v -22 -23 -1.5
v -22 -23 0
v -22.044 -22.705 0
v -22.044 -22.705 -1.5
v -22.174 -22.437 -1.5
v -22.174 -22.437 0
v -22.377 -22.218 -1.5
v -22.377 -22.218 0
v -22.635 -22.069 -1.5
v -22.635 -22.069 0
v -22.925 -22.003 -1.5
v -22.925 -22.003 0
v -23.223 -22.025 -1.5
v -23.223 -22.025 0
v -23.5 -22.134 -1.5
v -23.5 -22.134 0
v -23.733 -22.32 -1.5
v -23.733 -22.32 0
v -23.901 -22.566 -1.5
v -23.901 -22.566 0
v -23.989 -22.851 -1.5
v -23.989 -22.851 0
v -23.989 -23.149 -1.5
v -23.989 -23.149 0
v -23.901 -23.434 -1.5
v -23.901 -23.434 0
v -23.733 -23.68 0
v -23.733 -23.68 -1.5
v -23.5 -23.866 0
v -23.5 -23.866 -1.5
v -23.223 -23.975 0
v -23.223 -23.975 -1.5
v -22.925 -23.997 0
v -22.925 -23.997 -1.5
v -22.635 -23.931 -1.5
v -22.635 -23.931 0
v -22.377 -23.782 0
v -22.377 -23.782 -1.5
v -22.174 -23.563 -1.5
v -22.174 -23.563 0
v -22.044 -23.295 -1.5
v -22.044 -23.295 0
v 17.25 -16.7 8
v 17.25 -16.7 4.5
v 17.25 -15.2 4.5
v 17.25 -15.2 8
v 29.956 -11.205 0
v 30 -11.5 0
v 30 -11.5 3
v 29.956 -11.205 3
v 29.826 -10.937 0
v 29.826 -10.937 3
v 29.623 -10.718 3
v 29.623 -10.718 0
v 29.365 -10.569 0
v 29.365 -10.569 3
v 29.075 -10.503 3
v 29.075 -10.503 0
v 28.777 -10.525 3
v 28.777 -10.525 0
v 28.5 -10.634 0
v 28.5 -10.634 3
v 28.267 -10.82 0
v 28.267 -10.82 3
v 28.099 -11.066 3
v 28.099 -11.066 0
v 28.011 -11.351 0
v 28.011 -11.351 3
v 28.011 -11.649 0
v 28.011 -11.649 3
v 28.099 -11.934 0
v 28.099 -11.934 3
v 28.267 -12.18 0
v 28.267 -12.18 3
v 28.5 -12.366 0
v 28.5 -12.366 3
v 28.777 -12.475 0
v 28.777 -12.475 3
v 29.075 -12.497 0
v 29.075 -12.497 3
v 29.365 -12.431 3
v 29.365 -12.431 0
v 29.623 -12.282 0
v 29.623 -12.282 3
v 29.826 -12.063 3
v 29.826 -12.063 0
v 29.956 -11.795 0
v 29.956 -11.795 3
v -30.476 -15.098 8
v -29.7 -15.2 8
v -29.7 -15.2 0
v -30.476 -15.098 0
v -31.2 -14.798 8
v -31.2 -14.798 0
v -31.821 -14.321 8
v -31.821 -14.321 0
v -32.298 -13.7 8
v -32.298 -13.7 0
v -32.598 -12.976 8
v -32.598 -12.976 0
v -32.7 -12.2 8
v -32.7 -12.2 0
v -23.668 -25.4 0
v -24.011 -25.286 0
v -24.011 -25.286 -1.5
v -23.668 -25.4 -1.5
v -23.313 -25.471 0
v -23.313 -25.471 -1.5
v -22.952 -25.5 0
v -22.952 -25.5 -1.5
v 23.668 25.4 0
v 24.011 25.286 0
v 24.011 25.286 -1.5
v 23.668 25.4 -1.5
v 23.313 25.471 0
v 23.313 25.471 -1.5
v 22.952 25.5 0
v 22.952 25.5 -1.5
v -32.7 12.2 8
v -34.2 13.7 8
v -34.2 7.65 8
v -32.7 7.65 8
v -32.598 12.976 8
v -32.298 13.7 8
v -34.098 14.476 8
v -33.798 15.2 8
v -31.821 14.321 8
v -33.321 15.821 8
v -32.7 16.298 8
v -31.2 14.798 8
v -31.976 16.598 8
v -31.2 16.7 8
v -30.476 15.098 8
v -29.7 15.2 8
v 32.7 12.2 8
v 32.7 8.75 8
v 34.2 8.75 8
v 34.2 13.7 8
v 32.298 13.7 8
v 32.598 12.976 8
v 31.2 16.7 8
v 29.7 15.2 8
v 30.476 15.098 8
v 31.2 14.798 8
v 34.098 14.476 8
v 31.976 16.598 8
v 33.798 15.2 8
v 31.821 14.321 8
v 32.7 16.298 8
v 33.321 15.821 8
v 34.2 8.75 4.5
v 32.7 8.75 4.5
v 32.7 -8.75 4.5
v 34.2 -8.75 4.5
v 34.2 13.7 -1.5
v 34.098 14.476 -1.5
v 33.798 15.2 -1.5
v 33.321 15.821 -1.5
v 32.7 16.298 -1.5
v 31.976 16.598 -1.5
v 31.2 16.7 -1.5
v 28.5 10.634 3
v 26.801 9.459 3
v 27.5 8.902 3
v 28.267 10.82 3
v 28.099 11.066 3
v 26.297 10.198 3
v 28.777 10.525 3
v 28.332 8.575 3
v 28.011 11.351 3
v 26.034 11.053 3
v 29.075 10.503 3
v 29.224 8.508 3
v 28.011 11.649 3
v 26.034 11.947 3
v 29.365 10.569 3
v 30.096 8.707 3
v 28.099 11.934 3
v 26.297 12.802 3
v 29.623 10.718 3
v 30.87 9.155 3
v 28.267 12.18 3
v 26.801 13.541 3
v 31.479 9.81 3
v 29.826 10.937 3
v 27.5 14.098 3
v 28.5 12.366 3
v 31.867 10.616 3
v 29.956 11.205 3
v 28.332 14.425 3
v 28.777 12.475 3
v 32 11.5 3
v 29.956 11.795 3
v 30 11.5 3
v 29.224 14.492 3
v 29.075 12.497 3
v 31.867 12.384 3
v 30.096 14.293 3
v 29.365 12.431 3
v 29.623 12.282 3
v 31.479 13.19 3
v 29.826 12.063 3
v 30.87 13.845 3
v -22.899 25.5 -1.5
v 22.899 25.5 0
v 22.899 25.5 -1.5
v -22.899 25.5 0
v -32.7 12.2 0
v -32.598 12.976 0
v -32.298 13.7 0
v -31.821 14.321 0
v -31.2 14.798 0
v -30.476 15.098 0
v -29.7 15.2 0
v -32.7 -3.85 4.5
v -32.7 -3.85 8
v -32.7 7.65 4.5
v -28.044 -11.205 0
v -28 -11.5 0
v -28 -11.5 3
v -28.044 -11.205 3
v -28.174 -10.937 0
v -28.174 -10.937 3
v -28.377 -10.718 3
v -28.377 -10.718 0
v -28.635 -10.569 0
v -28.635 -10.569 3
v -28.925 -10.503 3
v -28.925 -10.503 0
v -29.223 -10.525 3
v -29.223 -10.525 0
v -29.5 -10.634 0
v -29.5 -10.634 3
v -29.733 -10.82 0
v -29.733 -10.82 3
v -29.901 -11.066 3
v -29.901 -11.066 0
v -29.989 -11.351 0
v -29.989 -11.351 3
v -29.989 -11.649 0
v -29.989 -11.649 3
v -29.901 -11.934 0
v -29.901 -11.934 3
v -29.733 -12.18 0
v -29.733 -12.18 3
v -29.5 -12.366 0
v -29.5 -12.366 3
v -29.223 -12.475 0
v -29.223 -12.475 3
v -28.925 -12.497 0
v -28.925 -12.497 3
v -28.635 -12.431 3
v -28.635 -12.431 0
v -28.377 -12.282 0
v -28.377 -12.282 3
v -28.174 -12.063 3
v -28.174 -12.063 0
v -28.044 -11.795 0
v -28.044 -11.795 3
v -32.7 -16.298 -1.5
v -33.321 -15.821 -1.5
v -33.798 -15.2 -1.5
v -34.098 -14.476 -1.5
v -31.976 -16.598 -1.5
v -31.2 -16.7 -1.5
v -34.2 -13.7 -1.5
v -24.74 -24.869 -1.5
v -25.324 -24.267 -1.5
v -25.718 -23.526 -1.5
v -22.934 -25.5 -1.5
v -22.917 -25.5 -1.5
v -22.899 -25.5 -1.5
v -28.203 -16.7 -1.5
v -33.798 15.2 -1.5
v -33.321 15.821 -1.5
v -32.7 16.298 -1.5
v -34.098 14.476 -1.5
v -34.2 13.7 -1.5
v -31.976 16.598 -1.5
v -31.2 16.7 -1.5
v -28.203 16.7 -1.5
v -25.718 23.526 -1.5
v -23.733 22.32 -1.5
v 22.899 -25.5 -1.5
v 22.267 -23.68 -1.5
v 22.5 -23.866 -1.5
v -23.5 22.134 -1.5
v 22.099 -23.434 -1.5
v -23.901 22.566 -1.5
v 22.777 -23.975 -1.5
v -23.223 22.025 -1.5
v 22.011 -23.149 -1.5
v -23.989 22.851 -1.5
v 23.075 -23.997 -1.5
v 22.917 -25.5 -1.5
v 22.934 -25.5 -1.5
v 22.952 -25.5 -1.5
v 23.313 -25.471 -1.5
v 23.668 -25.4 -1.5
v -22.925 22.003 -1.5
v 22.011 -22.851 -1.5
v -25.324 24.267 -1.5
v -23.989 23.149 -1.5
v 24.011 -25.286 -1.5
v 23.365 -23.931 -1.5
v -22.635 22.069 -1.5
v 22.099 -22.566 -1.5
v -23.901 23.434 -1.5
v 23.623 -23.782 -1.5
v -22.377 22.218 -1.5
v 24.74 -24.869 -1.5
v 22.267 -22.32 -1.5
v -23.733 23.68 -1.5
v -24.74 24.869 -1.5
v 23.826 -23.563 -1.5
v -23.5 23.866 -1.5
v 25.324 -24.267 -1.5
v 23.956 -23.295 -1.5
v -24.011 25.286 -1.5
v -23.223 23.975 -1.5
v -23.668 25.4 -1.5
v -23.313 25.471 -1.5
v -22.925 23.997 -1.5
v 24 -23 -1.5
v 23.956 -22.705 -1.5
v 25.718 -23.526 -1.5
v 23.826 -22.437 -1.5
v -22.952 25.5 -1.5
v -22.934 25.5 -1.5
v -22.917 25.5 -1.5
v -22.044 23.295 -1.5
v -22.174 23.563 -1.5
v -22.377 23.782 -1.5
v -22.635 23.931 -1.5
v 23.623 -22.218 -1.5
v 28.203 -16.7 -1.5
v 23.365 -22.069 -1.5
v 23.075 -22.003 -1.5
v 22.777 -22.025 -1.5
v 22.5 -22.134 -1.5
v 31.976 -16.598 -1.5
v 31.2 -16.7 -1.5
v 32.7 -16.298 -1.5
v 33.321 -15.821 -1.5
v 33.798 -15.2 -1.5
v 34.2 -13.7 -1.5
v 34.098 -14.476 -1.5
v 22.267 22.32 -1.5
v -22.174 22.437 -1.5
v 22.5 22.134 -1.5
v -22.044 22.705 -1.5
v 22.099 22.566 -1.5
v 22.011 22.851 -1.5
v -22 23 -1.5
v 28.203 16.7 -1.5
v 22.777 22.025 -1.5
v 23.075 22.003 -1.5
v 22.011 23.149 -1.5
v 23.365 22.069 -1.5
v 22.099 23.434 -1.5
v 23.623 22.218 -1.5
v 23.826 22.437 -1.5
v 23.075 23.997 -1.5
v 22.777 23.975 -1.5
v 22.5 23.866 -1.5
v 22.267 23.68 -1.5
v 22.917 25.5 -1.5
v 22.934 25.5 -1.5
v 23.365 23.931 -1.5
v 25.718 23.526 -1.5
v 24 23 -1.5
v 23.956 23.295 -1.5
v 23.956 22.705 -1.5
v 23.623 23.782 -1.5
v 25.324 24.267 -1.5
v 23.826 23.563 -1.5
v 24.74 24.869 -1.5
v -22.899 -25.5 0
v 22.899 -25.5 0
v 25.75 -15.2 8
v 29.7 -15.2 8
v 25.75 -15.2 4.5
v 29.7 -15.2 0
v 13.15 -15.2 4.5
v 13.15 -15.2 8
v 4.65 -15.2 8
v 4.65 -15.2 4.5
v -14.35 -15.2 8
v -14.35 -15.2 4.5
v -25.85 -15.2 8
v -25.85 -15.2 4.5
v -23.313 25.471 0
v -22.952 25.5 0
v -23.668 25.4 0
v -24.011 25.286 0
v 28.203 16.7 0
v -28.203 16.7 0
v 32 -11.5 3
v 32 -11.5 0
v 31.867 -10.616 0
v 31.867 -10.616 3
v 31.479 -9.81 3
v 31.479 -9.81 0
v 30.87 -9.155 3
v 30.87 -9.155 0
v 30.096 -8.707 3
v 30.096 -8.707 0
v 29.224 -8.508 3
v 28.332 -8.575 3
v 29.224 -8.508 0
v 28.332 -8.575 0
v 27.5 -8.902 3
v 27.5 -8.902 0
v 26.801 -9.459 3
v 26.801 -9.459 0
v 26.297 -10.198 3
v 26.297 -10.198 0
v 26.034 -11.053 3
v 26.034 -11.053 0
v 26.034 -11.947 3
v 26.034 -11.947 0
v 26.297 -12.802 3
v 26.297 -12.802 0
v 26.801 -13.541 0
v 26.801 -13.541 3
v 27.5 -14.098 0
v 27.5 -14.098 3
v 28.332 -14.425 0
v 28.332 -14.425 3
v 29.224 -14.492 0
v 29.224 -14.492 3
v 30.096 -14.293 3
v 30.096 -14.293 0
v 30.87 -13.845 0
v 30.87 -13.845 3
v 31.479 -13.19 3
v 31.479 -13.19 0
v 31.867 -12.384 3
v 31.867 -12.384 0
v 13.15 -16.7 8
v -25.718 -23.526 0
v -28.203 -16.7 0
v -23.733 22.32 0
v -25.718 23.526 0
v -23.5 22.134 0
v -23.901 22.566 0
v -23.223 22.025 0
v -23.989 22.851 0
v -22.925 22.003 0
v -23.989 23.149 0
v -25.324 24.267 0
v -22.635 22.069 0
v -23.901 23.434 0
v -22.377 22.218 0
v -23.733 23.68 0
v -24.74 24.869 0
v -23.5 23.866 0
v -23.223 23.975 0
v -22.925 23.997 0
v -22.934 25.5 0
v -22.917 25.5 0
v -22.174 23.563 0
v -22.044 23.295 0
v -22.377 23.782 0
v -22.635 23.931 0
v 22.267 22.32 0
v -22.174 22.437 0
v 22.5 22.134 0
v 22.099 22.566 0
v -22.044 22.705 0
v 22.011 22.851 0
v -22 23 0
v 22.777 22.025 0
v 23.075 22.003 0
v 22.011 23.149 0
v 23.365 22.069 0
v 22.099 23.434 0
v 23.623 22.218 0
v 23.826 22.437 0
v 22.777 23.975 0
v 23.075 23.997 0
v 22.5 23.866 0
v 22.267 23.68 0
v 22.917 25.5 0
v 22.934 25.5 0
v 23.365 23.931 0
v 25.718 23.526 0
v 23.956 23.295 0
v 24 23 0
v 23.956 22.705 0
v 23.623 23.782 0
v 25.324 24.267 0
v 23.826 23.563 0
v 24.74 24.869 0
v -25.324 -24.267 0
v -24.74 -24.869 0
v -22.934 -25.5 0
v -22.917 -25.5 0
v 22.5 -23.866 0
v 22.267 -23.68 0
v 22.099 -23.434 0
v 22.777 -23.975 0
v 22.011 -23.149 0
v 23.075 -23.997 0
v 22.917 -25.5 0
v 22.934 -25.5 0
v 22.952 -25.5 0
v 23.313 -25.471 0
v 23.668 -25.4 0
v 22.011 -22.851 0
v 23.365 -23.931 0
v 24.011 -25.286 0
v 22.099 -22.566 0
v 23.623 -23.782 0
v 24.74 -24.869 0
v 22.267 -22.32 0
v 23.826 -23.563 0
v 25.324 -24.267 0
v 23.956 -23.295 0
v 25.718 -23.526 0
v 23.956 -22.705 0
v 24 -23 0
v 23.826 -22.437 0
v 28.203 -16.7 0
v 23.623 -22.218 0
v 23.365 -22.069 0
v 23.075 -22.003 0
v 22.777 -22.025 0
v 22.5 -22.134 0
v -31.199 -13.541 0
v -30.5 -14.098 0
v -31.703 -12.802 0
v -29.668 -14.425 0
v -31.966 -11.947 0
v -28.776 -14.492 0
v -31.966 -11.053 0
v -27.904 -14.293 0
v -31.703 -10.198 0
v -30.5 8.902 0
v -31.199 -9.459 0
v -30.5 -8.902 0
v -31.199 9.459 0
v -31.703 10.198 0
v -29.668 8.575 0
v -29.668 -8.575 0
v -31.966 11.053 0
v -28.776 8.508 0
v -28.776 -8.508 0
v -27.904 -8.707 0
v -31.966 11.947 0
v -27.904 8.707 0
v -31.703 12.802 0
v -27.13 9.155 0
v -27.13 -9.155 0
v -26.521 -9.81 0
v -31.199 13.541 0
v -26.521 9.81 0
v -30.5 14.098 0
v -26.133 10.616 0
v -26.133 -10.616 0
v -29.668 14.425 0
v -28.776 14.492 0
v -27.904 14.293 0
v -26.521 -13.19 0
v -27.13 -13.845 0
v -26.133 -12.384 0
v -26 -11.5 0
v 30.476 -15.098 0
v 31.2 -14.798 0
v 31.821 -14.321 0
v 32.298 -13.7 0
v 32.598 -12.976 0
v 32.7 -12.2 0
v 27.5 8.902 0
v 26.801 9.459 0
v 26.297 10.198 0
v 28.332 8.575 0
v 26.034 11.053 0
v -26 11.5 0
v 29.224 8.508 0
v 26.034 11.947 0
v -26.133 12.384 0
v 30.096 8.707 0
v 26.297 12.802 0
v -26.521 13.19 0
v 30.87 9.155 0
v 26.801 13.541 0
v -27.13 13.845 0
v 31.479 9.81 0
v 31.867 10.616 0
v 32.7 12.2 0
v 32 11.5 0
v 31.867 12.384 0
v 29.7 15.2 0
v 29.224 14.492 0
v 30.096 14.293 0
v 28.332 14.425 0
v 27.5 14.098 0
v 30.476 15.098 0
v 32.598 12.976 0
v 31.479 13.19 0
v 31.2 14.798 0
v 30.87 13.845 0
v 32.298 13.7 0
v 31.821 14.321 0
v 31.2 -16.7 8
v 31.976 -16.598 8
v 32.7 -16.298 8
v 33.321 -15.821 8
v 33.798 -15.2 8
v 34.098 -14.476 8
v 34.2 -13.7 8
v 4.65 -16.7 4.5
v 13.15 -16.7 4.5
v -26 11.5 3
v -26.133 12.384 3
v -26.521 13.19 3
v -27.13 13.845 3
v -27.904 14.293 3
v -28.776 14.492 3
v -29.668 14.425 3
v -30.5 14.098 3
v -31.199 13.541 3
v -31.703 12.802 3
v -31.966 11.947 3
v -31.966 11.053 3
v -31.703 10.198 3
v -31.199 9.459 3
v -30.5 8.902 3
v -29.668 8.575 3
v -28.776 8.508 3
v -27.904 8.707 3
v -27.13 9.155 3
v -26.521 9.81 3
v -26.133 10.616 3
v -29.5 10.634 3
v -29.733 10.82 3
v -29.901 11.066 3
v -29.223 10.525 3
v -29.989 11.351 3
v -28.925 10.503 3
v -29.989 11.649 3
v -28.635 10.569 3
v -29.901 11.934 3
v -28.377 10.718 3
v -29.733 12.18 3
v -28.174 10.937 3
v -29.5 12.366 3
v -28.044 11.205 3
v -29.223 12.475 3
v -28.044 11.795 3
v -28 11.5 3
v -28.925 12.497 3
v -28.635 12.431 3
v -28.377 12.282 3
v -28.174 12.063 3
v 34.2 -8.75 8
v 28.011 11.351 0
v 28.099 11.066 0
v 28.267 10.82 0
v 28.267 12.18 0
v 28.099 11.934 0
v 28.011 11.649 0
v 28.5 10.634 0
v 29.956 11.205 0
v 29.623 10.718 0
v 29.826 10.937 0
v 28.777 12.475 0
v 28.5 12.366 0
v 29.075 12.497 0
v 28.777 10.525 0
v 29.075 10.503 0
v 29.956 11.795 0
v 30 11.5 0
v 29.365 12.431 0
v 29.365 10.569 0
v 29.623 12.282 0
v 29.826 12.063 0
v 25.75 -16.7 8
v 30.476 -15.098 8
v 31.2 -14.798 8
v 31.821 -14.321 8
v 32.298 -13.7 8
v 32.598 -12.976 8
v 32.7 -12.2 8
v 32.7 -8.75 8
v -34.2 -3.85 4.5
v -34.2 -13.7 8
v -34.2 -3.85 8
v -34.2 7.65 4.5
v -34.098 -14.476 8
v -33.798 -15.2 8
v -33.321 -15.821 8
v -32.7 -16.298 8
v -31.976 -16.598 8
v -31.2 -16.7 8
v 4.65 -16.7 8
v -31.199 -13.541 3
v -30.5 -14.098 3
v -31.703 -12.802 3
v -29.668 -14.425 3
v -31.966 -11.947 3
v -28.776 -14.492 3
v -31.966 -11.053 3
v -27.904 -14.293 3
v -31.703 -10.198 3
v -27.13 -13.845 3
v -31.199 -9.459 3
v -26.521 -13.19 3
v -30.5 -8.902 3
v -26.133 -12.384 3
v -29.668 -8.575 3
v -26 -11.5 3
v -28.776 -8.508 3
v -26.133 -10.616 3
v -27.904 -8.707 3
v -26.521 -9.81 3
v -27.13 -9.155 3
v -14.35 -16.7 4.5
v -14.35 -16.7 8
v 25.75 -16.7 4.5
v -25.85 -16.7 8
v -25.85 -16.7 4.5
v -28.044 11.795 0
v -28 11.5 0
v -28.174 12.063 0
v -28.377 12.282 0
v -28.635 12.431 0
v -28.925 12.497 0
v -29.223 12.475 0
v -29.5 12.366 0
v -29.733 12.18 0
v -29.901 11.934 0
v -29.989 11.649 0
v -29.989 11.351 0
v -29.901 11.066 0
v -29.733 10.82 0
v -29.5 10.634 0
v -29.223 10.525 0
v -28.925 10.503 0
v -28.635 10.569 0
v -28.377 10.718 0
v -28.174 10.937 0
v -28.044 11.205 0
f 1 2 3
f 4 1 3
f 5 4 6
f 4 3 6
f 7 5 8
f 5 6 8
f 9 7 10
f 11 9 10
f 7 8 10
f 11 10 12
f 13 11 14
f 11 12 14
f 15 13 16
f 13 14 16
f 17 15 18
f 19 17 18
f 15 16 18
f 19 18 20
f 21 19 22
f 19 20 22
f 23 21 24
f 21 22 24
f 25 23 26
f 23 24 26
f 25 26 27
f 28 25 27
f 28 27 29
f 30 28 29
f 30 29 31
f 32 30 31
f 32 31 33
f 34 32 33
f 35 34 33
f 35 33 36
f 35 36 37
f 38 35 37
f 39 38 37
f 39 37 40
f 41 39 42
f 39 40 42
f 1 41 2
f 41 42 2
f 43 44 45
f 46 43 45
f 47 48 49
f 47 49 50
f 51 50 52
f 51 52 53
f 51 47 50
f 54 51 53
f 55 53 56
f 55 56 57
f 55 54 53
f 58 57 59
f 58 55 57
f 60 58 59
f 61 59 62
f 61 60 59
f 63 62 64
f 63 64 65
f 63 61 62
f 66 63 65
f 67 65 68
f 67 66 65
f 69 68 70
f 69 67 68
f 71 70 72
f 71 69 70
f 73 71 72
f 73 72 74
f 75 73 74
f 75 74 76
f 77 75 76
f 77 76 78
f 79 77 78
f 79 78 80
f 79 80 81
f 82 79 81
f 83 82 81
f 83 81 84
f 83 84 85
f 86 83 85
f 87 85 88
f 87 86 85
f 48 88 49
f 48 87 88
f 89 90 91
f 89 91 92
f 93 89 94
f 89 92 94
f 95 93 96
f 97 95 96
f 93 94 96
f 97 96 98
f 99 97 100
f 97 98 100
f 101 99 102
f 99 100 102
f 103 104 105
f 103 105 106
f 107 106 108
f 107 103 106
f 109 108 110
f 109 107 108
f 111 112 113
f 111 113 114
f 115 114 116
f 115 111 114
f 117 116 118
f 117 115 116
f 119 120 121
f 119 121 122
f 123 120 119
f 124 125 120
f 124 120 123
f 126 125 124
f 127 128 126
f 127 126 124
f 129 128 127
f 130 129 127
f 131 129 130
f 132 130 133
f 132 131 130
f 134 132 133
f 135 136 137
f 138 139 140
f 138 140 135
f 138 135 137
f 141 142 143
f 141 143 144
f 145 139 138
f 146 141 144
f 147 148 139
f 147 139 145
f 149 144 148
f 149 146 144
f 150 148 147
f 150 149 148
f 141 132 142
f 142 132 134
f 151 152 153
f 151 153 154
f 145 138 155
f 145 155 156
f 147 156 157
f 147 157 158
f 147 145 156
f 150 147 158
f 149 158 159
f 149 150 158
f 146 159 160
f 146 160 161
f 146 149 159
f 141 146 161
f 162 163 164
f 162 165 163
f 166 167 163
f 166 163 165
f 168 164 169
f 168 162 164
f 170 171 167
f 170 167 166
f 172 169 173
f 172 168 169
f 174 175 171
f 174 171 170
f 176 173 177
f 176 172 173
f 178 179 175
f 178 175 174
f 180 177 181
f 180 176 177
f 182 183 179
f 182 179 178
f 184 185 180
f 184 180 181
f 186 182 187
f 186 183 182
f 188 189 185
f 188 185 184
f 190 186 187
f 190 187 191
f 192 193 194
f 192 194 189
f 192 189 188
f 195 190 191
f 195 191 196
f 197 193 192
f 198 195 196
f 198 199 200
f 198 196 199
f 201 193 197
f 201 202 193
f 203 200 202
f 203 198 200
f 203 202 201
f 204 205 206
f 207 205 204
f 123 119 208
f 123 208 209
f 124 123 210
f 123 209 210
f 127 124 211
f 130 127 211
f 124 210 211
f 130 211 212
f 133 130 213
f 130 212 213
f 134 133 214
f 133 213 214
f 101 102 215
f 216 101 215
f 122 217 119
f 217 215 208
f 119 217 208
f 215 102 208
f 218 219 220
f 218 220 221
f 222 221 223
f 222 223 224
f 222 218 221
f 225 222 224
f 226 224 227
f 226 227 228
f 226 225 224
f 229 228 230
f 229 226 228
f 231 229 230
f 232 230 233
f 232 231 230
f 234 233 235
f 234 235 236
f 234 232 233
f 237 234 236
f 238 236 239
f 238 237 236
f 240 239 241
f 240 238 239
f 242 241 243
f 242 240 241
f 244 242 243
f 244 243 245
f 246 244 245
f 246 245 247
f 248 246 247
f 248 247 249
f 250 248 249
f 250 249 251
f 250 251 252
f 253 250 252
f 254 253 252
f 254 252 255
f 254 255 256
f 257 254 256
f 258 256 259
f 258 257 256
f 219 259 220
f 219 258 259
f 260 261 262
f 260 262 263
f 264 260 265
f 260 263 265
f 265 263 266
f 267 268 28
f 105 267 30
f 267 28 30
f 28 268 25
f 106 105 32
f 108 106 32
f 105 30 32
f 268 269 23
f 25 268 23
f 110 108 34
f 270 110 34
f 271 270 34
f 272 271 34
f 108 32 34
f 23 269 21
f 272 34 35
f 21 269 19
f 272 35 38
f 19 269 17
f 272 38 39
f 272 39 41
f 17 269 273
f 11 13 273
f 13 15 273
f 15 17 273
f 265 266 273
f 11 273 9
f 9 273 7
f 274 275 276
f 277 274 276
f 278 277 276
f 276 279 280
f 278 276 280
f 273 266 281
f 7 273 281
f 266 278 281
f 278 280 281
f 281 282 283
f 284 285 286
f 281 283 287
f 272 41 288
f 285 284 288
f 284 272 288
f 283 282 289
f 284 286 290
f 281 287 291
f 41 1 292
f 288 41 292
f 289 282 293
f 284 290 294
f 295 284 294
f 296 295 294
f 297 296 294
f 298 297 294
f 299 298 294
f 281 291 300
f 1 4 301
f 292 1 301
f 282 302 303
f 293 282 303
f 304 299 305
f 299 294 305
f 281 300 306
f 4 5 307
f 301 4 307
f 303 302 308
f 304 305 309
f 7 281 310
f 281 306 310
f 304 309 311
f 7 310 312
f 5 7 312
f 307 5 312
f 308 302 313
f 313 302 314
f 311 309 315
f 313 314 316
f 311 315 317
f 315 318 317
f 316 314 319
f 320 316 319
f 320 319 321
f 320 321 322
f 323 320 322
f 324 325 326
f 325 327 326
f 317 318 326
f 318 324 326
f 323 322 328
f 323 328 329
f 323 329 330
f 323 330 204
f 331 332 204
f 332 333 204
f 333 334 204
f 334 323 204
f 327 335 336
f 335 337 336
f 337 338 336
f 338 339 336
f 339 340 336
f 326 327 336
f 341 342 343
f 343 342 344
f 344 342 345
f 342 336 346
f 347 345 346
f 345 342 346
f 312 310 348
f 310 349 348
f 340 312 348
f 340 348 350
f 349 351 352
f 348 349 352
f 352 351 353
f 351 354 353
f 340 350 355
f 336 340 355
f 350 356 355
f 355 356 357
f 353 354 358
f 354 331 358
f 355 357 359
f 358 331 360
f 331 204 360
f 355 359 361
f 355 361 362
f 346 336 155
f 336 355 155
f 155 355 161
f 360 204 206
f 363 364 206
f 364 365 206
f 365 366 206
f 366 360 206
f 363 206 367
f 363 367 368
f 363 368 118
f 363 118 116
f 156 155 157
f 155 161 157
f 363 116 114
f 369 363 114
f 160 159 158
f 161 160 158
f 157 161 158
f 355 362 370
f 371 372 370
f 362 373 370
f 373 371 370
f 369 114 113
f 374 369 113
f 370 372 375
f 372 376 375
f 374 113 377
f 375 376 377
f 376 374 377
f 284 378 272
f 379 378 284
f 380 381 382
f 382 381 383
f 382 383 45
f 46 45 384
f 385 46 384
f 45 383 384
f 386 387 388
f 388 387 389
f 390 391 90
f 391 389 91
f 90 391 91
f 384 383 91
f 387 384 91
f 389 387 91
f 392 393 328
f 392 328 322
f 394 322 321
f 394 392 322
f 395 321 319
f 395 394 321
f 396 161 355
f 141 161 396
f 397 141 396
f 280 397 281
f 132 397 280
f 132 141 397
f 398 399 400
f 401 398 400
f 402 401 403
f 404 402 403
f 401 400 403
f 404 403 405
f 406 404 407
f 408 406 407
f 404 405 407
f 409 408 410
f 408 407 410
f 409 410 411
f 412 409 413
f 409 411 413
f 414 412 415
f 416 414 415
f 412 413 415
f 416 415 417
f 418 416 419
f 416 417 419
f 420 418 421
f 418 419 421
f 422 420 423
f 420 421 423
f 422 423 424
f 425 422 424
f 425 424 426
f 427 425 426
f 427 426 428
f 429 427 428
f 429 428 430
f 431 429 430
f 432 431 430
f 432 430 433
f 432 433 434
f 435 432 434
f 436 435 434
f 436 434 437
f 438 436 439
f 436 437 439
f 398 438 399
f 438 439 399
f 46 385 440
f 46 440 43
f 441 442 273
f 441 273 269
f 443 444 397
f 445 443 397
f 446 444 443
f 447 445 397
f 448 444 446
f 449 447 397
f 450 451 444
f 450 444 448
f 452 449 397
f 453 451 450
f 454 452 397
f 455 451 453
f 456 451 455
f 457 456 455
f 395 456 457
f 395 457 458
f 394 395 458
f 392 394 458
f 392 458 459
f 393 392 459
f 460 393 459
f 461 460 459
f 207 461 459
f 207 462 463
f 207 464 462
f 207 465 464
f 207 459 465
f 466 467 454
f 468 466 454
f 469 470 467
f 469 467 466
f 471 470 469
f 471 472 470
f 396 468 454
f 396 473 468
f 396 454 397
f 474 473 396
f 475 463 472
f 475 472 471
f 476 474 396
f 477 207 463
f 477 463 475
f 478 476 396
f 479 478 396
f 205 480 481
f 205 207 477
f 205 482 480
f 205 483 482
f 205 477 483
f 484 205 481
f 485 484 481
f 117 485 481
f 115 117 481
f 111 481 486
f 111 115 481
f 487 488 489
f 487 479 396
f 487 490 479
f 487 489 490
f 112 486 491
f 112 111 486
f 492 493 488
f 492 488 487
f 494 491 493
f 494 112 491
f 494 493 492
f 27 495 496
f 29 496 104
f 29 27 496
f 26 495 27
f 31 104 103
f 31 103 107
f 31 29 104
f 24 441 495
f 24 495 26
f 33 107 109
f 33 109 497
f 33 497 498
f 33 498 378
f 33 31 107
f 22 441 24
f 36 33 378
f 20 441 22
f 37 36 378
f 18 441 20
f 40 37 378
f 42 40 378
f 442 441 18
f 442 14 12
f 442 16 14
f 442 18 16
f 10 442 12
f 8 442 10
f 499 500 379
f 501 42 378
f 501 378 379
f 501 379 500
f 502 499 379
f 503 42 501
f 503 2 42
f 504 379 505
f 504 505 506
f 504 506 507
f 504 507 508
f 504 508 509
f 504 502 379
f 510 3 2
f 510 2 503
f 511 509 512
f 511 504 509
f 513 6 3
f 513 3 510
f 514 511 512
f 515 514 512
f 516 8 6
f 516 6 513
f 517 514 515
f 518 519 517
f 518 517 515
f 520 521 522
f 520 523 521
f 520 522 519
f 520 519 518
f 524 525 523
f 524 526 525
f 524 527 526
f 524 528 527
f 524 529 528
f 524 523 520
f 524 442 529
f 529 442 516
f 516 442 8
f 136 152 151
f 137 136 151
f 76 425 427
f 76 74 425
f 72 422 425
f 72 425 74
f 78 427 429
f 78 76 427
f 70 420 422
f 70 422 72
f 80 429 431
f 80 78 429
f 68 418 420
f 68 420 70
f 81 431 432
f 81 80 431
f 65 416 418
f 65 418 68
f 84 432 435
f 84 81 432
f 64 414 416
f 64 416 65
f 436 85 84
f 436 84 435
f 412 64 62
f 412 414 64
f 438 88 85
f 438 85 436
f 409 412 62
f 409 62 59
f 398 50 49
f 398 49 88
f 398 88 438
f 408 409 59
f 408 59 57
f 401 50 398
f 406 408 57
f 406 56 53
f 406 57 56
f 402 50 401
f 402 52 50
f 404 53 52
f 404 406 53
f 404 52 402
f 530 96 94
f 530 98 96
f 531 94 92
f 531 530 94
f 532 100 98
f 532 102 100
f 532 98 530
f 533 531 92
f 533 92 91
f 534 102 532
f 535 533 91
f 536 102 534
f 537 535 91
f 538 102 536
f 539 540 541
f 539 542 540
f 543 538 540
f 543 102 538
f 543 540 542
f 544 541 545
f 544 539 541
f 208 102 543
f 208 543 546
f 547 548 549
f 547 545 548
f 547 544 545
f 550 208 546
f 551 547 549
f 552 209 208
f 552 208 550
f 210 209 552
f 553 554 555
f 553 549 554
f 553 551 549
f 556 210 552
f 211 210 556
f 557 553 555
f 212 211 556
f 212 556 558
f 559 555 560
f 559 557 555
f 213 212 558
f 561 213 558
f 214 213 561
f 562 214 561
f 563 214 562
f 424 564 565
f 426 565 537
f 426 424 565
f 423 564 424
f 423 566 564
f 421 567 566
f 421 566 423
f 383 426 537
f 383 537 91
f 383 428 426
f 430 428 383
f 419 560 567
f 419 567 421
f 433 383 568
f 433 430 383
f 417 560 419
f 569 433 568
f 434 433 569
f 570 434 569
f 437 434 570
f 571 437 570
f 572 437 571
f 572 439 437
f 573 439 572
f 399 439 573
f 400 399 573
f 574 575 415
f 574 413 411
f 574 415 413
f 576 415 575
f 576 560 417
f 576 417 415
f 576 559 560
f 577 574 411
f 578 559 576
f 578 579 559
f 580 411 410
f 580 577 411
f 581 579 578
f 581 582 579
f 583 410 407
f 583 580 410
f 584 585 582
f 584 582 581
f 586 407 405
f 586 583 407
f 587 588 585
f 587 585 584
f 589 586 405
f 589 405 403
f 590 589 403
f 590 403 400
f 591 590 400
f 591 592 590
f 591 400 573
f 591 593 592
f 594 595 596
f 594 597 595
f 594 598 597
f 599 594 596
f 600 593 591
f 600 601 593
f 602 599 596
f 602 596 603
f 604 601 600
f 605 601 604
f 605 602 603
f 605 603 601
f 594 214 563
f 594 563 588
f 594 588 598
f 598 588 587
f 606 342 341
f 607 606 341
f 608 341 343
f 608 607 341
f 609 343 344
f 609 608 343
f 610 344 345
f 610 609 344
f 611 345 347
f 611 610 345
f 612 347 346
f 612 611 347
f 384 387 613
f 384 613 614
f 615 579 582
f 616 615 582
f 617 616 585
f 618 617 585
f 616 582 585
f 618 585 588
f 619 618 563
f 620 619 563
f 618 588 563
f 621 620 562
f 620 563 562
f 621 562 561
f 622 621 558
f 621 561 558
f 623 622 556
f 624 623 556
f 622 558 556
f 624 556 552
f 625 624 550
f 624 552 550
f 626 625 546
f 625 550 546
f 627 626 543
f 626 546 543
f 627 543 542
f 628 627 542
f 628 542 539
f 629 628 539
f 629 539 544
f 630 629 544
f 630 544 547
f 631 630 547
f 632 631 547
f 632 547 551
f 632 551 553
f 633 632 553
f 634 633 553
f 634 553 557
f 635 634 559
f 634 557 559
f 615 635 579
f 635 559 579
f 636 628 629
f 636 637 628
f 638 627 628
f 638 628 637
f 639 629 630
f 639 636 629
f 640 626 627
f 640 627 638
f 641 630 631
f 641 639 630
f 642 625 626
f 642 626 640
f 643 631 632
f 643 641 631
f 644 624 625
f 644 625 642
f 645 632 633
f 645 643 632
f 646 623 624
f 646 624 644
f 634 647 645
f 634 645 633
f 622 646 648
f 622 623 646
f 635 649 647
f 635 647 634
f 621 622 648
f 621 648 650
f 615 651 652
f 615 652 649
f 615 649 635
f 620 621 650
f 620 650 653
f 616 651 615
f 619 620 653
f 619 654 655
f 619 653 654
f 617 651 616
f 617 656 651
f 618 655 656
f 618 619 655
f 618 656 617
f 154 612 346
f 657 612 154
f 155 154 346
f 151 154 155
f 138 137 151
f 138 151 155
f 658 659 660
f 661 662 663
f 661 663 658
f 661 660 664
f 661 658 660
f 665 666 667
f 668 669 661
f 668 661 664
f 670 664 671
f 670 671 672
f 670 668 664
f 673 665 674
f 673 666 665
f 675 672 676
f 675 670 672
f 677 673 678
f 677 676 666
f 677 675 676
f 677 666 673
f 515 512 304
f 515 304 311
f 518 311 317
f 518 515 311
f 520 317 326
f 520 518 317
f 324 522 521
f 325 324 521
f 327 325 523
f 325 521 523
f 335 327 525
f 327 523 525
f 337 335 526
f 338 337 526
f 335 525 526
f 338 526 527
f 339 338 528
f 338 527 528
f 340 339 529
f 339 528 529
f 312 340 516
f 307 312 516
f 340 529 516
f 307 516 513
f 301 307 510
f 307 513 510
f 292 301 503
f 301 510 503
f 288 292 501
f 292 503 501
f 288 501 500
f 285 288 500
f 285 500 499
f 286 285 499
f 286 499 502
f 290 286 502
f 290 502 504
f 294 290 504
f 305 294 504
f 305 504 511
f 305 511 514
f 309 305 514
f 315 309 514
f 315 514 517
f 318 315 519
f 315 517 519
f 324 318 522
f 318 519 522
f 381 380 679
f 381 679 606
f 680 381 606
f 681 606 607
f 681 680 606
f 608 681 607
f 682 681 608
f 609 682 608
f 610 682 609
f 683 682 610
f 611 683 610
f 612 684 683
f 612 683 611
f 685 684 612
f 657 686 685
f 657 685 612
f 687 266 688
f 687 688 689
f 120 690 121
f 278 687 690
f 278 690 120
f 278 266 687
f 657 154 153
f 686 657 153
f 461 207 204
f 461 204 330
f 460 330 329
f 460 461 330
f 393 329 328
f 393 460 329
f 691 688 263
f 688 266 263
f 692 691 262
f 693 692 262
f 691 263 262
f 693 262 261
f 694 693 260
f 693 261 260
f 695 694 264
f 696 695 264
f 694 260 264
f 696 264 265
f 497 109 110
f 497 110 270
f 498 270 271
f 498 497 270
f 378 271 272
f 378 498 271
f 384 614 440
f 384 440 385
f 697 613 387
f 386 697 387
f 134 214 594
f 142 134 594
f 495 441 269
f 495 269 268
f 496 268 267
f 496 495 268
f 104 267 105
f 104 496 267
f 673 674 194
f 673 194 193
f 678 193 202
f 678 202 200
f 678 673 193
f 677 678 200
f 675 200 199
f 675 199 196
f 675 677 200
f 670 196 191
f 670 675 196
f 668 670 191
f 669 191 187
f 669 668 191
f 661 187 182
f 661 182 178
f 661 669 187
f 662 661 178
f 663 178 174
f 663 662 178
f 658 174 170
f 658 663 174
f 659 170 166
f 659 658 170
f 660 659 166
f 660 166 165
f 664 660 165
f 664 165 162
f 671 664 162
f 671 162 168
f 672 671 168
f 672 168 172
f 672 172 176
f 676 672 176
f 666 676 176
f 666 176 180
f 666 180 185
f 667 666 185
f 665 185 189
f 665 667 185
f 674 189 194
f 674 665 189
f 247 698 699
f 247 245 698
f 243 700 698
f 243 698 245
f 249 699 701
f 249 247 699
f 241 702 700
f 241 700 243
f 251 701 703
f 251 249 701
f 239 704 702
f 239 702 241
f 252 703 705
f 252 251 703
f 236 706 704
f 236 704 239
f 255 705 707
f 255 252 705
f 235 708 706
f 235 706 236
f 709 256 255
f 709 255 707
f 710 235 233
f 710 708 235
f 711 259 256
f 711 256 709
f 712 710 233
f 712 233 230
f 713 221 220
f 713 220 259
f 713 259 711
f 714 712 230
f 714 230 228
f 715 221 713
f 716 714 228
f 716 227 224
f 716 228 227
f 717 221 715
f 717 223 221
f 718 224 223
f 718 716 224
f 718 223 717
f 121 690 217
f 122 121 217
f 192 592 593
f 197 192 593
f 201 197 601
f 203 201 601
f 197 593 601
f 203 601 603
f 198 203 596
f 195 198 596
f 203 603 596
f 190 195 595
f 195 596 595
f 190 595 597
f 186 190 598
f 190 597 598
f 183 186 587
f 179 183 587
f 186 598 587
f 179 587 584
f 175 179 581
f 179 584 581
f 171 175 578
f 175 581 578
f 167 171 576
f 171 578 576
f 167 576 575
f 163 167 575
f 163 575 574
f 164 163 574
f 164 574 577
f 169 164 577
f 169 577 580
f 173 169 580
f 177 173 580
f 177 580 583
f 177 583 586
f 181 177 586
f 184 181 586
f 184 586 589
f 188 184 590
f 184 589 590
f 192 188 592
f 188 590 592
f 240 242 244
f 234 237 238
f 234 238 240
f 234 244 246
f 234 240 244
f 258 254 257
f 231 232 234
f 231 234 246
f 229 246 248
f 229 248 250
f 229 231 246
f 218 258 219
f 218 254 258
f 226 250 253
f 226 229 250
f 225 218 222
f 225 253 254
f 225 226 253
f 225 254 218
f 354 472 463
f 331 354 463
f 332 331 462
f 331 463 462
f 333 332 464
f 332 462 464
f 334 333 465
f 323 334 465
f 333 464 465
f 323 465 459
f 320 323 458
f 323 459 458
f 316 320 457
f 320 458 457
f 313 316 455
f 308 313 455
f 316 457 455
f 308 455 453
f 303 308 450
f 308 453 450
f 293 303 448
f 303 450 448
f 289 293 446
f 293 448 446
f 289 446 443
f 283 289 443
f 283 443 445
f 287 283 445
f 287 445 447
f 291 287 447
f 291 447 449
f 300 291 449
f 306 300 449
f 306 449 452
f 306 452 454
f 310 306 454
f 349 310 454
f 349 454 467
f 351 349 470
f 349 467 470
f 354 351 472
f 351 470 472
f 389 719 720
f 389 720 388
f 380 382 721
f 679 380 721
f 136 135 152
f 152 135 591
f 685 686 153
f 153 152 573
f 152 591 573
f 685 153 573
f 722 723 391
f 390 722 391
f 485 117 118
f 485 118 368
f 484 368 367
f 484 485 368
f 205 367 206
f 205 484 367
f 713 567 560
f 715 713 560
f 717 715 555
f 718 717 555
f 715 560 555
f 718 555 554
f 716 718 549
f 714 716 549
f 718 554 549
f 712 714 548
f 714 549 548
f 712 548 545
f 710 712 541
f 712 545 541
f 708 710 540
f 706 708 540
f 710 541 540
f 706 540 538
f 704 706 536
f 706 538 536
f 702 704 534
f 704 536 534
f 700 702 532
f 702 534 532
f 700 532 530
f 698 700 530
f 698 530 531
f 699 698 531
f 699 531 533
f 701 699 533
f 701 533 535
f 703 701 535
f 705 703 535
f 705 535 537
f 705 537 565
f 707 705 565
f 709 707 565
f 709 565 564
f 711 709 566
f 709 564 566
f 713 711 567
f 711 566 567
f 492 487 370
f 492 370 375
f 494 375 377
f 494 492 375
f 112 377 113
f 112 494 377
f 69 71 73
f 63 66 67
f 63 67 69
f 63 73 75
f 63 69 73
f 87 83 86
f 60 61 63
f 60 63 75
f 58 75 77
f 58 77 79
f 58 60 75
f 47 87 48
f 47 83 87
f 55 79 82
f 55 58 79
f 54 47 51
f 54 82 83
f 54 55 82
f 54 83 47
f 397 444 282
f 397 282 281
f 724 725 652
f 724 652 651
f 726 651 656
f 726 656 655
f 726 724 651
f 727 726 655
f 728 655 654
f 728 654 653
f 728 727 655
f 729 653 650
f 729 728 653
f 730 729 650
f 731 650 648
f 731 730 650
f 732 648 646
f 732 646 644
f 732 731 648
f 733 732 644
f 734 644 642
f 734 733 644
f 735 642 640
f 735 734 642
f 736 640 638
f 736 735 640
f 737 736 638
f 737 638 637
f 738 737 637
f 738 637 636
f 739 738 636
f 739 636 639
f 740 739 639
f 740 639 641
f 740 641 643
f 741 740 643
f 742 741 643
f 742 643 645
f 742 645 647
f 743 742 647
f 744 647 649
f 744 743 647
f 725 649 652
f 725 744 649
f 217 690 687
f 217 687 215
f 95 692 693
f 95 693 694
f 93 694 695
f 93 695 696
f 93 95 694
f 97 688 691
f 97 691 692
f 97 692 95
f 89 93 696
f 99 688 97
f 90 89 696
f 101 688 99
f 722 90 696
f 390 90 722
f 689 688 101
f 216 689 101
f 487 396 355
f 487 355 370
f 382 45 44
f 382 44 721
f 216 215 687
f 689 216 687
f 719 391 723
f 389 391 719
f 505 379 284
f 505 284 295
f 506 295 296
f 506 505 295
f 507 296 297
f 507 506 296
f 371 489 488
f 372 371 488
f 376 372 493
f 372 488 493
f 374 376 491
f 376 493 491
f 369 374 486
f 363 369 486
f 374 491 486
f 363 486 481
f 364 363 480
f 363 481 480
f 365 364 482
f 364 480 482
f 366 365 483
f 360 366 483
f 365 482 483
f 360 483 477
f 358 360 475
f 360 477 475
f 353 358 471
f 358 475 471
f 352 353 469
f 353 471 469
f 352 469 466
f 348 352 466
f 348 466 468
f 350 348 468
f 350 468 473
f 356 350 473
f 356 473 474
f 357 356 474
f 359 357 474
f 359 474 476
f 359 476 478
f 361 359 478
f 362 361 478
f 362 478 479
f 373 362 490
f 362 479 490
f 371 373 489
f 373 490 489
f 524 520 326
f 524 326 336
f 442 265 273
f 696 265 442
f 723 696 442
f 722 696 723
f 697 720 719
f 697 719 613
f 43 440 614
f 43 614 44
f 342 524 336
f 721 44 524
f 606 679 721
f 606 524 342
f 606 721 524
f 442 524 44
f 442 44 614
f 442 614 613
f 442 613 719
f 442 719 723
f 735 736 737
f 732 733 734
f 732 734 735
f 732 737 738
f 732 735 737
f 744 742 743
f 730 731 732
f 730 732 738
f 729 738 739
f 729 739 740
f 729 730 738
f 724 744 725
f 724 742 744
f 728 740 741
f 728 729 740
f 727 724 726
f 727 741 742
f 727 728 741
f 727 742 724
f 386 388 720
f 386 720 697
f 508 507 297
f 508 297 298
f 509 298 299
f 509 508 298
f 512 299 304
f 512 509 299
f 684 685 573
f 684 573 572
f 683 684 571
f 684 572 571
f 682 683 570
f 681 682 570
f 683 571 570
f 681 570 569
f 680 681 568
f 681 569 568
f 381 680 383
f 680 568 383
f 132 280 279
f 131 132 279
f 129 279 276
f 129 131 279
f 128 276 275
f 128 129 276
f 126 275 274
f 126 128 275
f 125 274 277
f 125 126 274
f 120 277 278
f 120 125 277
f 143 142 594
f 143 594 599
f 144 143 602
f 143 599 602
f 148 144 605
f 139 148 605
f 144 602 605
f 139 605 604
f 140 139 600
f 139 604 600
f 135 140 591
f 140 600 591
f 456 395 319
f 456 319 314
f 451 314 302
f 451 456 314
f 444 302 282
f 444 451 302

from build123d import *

# Parameters (mm, degrees)
F0_R     = 3
F0_W     = 19
F0_H     = 1.5
F0_R_2   = 1
F0_W_2   = 1.5
F0_H_2   = 17.5
F0_H_3   = 11.5
F0_W_3   = 11.5
F0_W_4   = 8.5
F0_W_5   = 4.1
F1_DEPTH = 1.5
F2_DEPTH = 3
F3_DEPTH = 8
F4_DEPTH = 4.5
F5_R     = 1
F6_DEPTH = 1.5


with BuildPart() as f1:
    # F0 (on Top) → F1 (new body)
    with BuildSketch(Plane.XY):
        with BuildLine():
            Line((29.7, 15.2), (-29.7, 15.2))
            ThreePointArc((-29.7, 15.2), (-31.8213203436, 14.3213203436), (-32.7, 12.2))
            Line((-32.7, 12.2), (-32.7, 7.65))
            Line((-32.7, 7.65), (-32.7, -3.85))
            Line((-32.7, -3.85), (-32.7, -12.2))
            ThreePointArc((-32.7, -12.2), (-31.8213203436, -14.3213203436), (-29.7, -15.2))
            Line((-29.7, -15.2), (-25.85, -15.2))
            Line((-25.85, -15.2), (-14.35, -15.2))
            Line((-14.35, -15.2), (4.65, -15.2))
            Line((4.65, -15.2), (13.15, -15.2))
            Line((13.15, -15.2), (17.25, -15.2))
            Line((17.25, -15.2), (25.75, -15.2))
            Line((25.75, -15.2), (29.7, -15.2))
            ThreePointArc((29.7, -15.2), (31.8213203436, -14.3213203436), (32.7, -12.2))
            Line((32.7, -12.2), (32.7, -8.75))
            Line((32.7, -8.75), (32.7, 8.75))
            Line((32.7, 8.75), (32.7, 12.2))
            ThreePointArc((32.7, 12.2), (31.8213203436, 14.3213203436), (29.7, 15.2))
        make_face()
        with Locations((-29, -11.5)):
            Circle(F0_R, mode=Mode.SUBTRACT)
        with Locations((29, -11.5)):
            Circle(F0_R, mode=Mode.SUBTRACT)
        with Locations((-29, 11.5)):
            Circle(F0_R, mode=Mode.SUBTRACT)
        with Locations((29, 11.5)):
            Circle(F0_R, mode=Mode.SUBTRACT)
        with BuildLine():
            ThreePointArc((-32.7, 12.2), (-31.8213203436, 14.3213203436), (-29.7, 15.2))
            Line((-29.7, 15.2), (29.7, 15.2))
            ThreePointArc((29.7, 15.2), (31.8213203436, 14.3213203436), (32.7, 12.2))
            Line((32.7, 12.2), (32.7, 8.75))
            Line((32.7, 8.75), (34.2, 8.75))
            Line((34.2, 8.75), (34.2, 13.7))
            ThreePointArc((34.2, 13.7), (33.3213203436, 15.8213203436), (31.2, 16.7))
            Line((31.2, 16.7), (-31.2, 16.7))
            ThreePointArc((-31.2, 16.7), (-33.3213203436, 15.8213203436), (-34.2, 13.7))
            Line((-34.2, 13.7), (-34.2, 7.65))
            Line((-34.2, 7.65), (-32.7, 7.65))
            Line((-32.7, 7.65), (-32.7, 12.2))
        make_face()
        with BuildLine():
            Line((-32.7, -12.2), (-32.7, -3.85))
            Line((-32.7, -3.85), (-34.2, -3.85))
            Line((-34.2, -3.85), (-34.2, -13.7))
            ThreePointArc((-34.2, -13.7), (-33.3213203436, -15.8213203436), (-31.2, -16.7))
            Line((-31.2, -16.7), (-25.85, -16.7))
            Line((-25.85, -16.7), (-25.85, -15.2))
            Line((-25.85, -15.2), (-29.7, -15.2))
            ThreePointArc((-29.7, -15.2), (-31.8213203436, -14.3213203436), (-32.7, -12.2))
        make_face()
        with Locations((-4.85, -15.95)):
            Rectangle(F0_W, F0_H)
        with Locations((-29, -11.5)):
            Circle(F0_R)
        with Locations((-29, -11.5)):
            Circle(F0_R_2, mode=Mode.SUBTRACT)
        with Locations((-29, 11.5)):
            Circle(F0_R)
        with Locations((-29, 11.5)):
            Circle(F0_R_2, mode=Mode.SUBTRACT)
        with Locations((29, -11.5)):
            Circle(F0_R)
        with Locations((29, -11.5)):
            Circle(F0_R_2, mode=Mode.SUBTRACT)
        with Locations((29, 11.5)):
            Circle(F0_R)
        with Locations((29, 11.5)):
            Circle(F0_R_2, mode=Mode.SUBTRACT)
        with Locations((33.45, 0)):
            Rectangle(F0_W_2, F0_H_2)
        with BuildLine():
            Line((34.2, -8.75), (32.7, -8.75))
            Line((32.7, -8.75), (32.7, -12.2))
            ThreePointArc((32.7, -12.2), (31.8213203436, -14.3213203436), (29.7, -15.2))
            Line((29.7, -15.2), (25.75, -15.2))
            Line((25.75, -15.2), (25.75, -16.7))
            Line((25.75, -16.7), (31.2, -16.7))
            ThreePointArc((31.2, -16.7), (33.3213203436, -15.8213203436), (34.2, -13.7))
            Line((34.2, -13.7), (34.2, -8.75))
        make_face()
        with Locations((-33.45, 1.9)):
            Rectangle(F0_W_2, F0_H_3)
        with Locations((-20.1, -15.95)):
            Rectangle(F0_W_3, F0_H)
        with Locations((21.5, -15.95)):
            Rectangle(F0_W_4, F0_H)
        with Locations((8.9, -15.95)):
            Rectangle(F0_W_4, F0_H)
        with Locations((15.2, -15.95)):
            Rectangle(F0_W_5, F0_H)
        with Locations((-29, -11.5)):
            Circle(F0_R_2)
        with Locations((-29, 11.5)):
            Circle(F0_R_2)
        with Locations((29, -11.5)):
            Circle(F0_R_2)
        with Locations((29, 11.5)):
            Circle(F0_R_2)
    extrude(amount=-F1_DEPTH)

    # F0 (on Top) → F2 (join)
    with BuildSketch(Plane.XY):
        with Locations((-29, 11.5)):
            Circle(F0_R)
        with Locations((-29, 11.5)):
            Circle(F0_R_2, mode=Mode.SUBTRACT)
        with Locations((-29, -11.5)):
            Circle(F0_R)
        with Locations((-29, -11.5)):
            Circle(F0_R_2, mode=Mode.SUBTRACT)
        with Locations((29, 11.5)):
            Circle(F0_R)
        with Locations((29, 11.5)):
            Circle(F0_R_2, mode=Mode.SUBTRACT)
        with Locations((29, -11.5)):
            Circle(F0_R)
        with Locations((29, -11.5)):
            Circle(F0_R_2, mode=Mode.SUBTRACT)
    extrude(amount=F2_DEPTH)

    # F0 (on Top) → F3 (join)
    with BuildSketch(Plane.XY):
        with BuildLine():
            Line((-32.7, -12.2), (-32.7, -3.85))
            Line((-32.7, -3.85), (-34.2, -3.85))
            Line((-34.2, -3.85), (-34.2, -13.7))
            ThreePointArc((-34.2, -13.7), (-33.3213203436, -15.8213203436), (-31.2, -16.7))
            Line((-31.2, -16.7), (-25.85, -16.7))
            Line((-25.85, -16.7), (-25.85, -15.2))
            Line((-25.85, -15.2), (-29.7, -15.2))
            ThreePointArc((-29.7, -15.2), (-31.8213203436, -14.3213203436), (-32.7, -12.2))
        make_face()
        with BuildLine():
            ThreePointArc((-32.7, 12.2), (-31.8213203436, 14.3213203436), (-29.7, 15.2))
            Line((-29.7, 15.2), (29.7, 15.2))
            ThreePointArc((29.7, 15.2), (31.8213203436, 14.3213203436), (32.7, 12.2))
            Line((32.7, 12.2), (32.7, 8.75))
            Line((32.7, 8.75), (34.2, 8.75))
            Line((34.2, 8.75), (34.2, 13.7))
            ThreePointArc((34.2, 13.7), (33.3213203436, 15.8213203436), (31.2, 16.7))
            Line((31.2, 16.7), (-31.2, 16.7))
            ThreePointArc((-31.2, 16.7), (-33.3213203436, 15.8213203436), (-34.2, 13.7))
            Line((-34.2, 13.7), (-34.2, 7.65))
            Line((-34.2, 7.65), (-32.7, 7.65))
            Line((-32.7, 7.65), (-32.7, 12.2))
        make_face()
        with Locations((-4.85, -15.95)):
            Rectangle(F0_W, F0_H)
        with Locations((15.2, -15.95)):
            Rectangle(F0_W_5, F0_H)
        with BuildLine():
            Line((34.2, -8.75), (32.7, -8.75))
            Line((32.7, -8.75), (32.7, -12.2))
            ThreePointArc((32.7, -12.2), (31.8213203436, -14.3213203436), (29.7, -15.2))
            Line((29.7, -15.2), (25.75, -15.2))
            Line((25.75, -15.2), (25.75, -16.7))
            Line((25.75, -16.7), (31.2, -16.7))
            ThreePointArc((31.2, -16.7), (33.3213203436, -15.8213203436), (34.2, -13.7))
            Line((34.2, -13.7), (34.2, -8.75))
        make_face()
    extrude(amount=F3_DEPTH)

    # F0 (on Top) → F4 (join)
    with BuildSketch(Plane.XY):
        with Locations((-33.45, 1.9)):
            Rectangle(F0_W_2, F0_H_3)
        with Locations((-20.1, -15.95)):
            Rectangle(F0_W_3, F0_H)
        with Locations((8.9, -15.95)):
            Rectangle(F0_W_4, F0_H)
        with Locations((21.5, -15.95)):
            Rectangle(F0_W_4, F0_H)
        with Locations((33.45, 0)):
            Rectangle(F0_W_2, F0_H_2)
    extrude(amount=F4_DEPTH)

    # F5 (on Top) → F6 (join)
    with BuildSketch(Plane.XY):
        with BuildLine():
            Line((28.2029380615, -16.7), (-28.2029380615, -16.7))
            Line((-28.2029380615, -16.7), (-25.7184552477, -23.52606043))
            ThreePointArc((-25.7184552477, -23.52606043), (-25.0528877677, -24.5886342507), (-24.0111634719, -25.2863832647))
            ThreePointArc((-24.0111634719, -25.2863832647), (-24.3642014734, -20.9050168641), (-20.5, -23))
            ThreePointArc((-20.5, -23), (-21.215336344, -24.7507071813), (-22.9519805079, -25.4995387831))
            ThreePointArc((-22.9519805079, -25.4995387831), (-22.9256799576, -25.4998846936), (-22.8993773854, -25.5))
            Line((-22.8993773854, -25.5), (22.8993773854, -25.5))
            ThreePointArc((22.8993773854, -25.5), (22.9256799576, -25.4998846936), (22.9519805079, -25.4995387831))
            ThreePointArc((22.9519805079, -25.4995387831), (21.2492928187, -21.215336344), (25.5, -23))
            ThreePointArc((25.5, -23), (25.0949831359, -24.3642014734), (24.0111634719, -25.2863832647))
            ThreePointArc((24.0111634719, -25.2863832647), (25.0528877677, -24.5886342507), (25.7184552477, -23.52606043))
            Line((25.7184552477, -23.52606043), (28.2029380615, -16.7))
        make_face()
        with BuildLine():
            ThreePointArc((-20.5, -23), (-24.3642014734, -20.9050168641), (-24.0111634719, -25.2863832647))
            ThreePointArc((-24.0111634719, -25.2863832647), (-23.4912467766, -25.441035638), (-22.9519805079, -25.4995387831))
            ThreePointArc((-22.9519805079, -25.4995387831), (-21.215336344, -24.7507071813), (-20.5, -23))
        make_face()
        with Locations((-23, -23)):
            Circle(F5_R, mode=Mode.SUBTRACT)
        with BuildLine():
            ThreePointArc((22.9519805079, -25.4995387831), (23.4912467766, -25.441035638), (24.0111634719, -25.2863832647))
            ThreePointArc((24.0111634719, -25.2863832647), (25.0949831359, -24.3642014734), (25.5, -23))
            ThreePointArc((25.5, -23), (21.2492928187, -21.215336344), (22.9519805079, -25.4995387831))
        make_face()
        with Locations((23, -23)):
            Circle(F5_R, mode=Mode.SUBTRACT)
        with BuildLine():
            Line((-25.7184552477, 23.52606043), (-28.2029380615, 16.7))
            Line((-28.2029380615, 16.7), (28.2029380615, 16.7))
            Line((28.2029380615, 16.7), (25.7184552477, 23.52606043))
            ThreePointArc((25.7184552477, 23.52606043), (25.0528877677, 24.5886342507), (24.0111634719, 25.2863832647))
            ThreePointArc((24.0111634719, 25.2863832647), (25.0949831359, 24.3642014734), (25.5, 23))
            ThreePointArc((25.5, 23), (21.2492928187, 21.215336344), (22.9519805079, 25.4995387831))
            ThreePointArc((22.9519805079, 25.4995387831), (22.9256799576, 25.4998846936), (22.8993773854, 25.5))
            Line((22.8993773854, 25.5), (-22.8993773854, 25.5))
            ThreePointArc((-22.8993773854, 25.5), (-22.9256799576, 25.4998846936), (-22.9519805079, 25.4995387831))
            ThreePointArc((-22.9519805079, 25.4995387831), (-21.215336344, 24.7507071813), (-20.5, 23))
            ThreePointArc((-20.5, 23), (-24.3642014734, 20.9050168641), (-24.0111634719, 25.2863832647))
            ThreePointArc((-24.0111634719, 25.2863832647), (-25.0528877677, 24.5886342507), (-25.7184552477, 23.52606043))
        make_face()
        with BuildLine():
            ThreePointArc((-22.9519805079, 25.4995387831), (-23.4912467766, 25.441035638), (-24.0111634719, 25.2863832647))
            ThreePointArc((-24.0111634719, 25.2863832647), (-24.3642014734, 20.9050168641), (-20.5, 23))
            ThreePointArc((-20.5, 23), (-21.215336344, 24.7507071813), (-22.9519805079, 25.4995387831))
        make_face()
        with Locations((-23, 23)):
            Circle(F5_R, mode=Mode.SUBTRACT)
        with BuildLine():
            ThreePointArc((25.5, 23), (25.0949831359, 24.3642014734), (24.0111634719, 25.2863832647))
            ThreePointArc((24.0111634719, 25.2863832647), (23.4912467766, 25.441035638), (22.9519805079, 25.4995387831))
            ThreePointArc((22.9519805079, 25.4995387831), (21.2492928187, 21.215336344), (25.5, 23))
        make_face()
        with Locations((23, 23)):
            Circle(F5_R, mode=Mode.SUBTRACT)
    extrude(amount=-F6_DEPTH)


solid = f1.part
